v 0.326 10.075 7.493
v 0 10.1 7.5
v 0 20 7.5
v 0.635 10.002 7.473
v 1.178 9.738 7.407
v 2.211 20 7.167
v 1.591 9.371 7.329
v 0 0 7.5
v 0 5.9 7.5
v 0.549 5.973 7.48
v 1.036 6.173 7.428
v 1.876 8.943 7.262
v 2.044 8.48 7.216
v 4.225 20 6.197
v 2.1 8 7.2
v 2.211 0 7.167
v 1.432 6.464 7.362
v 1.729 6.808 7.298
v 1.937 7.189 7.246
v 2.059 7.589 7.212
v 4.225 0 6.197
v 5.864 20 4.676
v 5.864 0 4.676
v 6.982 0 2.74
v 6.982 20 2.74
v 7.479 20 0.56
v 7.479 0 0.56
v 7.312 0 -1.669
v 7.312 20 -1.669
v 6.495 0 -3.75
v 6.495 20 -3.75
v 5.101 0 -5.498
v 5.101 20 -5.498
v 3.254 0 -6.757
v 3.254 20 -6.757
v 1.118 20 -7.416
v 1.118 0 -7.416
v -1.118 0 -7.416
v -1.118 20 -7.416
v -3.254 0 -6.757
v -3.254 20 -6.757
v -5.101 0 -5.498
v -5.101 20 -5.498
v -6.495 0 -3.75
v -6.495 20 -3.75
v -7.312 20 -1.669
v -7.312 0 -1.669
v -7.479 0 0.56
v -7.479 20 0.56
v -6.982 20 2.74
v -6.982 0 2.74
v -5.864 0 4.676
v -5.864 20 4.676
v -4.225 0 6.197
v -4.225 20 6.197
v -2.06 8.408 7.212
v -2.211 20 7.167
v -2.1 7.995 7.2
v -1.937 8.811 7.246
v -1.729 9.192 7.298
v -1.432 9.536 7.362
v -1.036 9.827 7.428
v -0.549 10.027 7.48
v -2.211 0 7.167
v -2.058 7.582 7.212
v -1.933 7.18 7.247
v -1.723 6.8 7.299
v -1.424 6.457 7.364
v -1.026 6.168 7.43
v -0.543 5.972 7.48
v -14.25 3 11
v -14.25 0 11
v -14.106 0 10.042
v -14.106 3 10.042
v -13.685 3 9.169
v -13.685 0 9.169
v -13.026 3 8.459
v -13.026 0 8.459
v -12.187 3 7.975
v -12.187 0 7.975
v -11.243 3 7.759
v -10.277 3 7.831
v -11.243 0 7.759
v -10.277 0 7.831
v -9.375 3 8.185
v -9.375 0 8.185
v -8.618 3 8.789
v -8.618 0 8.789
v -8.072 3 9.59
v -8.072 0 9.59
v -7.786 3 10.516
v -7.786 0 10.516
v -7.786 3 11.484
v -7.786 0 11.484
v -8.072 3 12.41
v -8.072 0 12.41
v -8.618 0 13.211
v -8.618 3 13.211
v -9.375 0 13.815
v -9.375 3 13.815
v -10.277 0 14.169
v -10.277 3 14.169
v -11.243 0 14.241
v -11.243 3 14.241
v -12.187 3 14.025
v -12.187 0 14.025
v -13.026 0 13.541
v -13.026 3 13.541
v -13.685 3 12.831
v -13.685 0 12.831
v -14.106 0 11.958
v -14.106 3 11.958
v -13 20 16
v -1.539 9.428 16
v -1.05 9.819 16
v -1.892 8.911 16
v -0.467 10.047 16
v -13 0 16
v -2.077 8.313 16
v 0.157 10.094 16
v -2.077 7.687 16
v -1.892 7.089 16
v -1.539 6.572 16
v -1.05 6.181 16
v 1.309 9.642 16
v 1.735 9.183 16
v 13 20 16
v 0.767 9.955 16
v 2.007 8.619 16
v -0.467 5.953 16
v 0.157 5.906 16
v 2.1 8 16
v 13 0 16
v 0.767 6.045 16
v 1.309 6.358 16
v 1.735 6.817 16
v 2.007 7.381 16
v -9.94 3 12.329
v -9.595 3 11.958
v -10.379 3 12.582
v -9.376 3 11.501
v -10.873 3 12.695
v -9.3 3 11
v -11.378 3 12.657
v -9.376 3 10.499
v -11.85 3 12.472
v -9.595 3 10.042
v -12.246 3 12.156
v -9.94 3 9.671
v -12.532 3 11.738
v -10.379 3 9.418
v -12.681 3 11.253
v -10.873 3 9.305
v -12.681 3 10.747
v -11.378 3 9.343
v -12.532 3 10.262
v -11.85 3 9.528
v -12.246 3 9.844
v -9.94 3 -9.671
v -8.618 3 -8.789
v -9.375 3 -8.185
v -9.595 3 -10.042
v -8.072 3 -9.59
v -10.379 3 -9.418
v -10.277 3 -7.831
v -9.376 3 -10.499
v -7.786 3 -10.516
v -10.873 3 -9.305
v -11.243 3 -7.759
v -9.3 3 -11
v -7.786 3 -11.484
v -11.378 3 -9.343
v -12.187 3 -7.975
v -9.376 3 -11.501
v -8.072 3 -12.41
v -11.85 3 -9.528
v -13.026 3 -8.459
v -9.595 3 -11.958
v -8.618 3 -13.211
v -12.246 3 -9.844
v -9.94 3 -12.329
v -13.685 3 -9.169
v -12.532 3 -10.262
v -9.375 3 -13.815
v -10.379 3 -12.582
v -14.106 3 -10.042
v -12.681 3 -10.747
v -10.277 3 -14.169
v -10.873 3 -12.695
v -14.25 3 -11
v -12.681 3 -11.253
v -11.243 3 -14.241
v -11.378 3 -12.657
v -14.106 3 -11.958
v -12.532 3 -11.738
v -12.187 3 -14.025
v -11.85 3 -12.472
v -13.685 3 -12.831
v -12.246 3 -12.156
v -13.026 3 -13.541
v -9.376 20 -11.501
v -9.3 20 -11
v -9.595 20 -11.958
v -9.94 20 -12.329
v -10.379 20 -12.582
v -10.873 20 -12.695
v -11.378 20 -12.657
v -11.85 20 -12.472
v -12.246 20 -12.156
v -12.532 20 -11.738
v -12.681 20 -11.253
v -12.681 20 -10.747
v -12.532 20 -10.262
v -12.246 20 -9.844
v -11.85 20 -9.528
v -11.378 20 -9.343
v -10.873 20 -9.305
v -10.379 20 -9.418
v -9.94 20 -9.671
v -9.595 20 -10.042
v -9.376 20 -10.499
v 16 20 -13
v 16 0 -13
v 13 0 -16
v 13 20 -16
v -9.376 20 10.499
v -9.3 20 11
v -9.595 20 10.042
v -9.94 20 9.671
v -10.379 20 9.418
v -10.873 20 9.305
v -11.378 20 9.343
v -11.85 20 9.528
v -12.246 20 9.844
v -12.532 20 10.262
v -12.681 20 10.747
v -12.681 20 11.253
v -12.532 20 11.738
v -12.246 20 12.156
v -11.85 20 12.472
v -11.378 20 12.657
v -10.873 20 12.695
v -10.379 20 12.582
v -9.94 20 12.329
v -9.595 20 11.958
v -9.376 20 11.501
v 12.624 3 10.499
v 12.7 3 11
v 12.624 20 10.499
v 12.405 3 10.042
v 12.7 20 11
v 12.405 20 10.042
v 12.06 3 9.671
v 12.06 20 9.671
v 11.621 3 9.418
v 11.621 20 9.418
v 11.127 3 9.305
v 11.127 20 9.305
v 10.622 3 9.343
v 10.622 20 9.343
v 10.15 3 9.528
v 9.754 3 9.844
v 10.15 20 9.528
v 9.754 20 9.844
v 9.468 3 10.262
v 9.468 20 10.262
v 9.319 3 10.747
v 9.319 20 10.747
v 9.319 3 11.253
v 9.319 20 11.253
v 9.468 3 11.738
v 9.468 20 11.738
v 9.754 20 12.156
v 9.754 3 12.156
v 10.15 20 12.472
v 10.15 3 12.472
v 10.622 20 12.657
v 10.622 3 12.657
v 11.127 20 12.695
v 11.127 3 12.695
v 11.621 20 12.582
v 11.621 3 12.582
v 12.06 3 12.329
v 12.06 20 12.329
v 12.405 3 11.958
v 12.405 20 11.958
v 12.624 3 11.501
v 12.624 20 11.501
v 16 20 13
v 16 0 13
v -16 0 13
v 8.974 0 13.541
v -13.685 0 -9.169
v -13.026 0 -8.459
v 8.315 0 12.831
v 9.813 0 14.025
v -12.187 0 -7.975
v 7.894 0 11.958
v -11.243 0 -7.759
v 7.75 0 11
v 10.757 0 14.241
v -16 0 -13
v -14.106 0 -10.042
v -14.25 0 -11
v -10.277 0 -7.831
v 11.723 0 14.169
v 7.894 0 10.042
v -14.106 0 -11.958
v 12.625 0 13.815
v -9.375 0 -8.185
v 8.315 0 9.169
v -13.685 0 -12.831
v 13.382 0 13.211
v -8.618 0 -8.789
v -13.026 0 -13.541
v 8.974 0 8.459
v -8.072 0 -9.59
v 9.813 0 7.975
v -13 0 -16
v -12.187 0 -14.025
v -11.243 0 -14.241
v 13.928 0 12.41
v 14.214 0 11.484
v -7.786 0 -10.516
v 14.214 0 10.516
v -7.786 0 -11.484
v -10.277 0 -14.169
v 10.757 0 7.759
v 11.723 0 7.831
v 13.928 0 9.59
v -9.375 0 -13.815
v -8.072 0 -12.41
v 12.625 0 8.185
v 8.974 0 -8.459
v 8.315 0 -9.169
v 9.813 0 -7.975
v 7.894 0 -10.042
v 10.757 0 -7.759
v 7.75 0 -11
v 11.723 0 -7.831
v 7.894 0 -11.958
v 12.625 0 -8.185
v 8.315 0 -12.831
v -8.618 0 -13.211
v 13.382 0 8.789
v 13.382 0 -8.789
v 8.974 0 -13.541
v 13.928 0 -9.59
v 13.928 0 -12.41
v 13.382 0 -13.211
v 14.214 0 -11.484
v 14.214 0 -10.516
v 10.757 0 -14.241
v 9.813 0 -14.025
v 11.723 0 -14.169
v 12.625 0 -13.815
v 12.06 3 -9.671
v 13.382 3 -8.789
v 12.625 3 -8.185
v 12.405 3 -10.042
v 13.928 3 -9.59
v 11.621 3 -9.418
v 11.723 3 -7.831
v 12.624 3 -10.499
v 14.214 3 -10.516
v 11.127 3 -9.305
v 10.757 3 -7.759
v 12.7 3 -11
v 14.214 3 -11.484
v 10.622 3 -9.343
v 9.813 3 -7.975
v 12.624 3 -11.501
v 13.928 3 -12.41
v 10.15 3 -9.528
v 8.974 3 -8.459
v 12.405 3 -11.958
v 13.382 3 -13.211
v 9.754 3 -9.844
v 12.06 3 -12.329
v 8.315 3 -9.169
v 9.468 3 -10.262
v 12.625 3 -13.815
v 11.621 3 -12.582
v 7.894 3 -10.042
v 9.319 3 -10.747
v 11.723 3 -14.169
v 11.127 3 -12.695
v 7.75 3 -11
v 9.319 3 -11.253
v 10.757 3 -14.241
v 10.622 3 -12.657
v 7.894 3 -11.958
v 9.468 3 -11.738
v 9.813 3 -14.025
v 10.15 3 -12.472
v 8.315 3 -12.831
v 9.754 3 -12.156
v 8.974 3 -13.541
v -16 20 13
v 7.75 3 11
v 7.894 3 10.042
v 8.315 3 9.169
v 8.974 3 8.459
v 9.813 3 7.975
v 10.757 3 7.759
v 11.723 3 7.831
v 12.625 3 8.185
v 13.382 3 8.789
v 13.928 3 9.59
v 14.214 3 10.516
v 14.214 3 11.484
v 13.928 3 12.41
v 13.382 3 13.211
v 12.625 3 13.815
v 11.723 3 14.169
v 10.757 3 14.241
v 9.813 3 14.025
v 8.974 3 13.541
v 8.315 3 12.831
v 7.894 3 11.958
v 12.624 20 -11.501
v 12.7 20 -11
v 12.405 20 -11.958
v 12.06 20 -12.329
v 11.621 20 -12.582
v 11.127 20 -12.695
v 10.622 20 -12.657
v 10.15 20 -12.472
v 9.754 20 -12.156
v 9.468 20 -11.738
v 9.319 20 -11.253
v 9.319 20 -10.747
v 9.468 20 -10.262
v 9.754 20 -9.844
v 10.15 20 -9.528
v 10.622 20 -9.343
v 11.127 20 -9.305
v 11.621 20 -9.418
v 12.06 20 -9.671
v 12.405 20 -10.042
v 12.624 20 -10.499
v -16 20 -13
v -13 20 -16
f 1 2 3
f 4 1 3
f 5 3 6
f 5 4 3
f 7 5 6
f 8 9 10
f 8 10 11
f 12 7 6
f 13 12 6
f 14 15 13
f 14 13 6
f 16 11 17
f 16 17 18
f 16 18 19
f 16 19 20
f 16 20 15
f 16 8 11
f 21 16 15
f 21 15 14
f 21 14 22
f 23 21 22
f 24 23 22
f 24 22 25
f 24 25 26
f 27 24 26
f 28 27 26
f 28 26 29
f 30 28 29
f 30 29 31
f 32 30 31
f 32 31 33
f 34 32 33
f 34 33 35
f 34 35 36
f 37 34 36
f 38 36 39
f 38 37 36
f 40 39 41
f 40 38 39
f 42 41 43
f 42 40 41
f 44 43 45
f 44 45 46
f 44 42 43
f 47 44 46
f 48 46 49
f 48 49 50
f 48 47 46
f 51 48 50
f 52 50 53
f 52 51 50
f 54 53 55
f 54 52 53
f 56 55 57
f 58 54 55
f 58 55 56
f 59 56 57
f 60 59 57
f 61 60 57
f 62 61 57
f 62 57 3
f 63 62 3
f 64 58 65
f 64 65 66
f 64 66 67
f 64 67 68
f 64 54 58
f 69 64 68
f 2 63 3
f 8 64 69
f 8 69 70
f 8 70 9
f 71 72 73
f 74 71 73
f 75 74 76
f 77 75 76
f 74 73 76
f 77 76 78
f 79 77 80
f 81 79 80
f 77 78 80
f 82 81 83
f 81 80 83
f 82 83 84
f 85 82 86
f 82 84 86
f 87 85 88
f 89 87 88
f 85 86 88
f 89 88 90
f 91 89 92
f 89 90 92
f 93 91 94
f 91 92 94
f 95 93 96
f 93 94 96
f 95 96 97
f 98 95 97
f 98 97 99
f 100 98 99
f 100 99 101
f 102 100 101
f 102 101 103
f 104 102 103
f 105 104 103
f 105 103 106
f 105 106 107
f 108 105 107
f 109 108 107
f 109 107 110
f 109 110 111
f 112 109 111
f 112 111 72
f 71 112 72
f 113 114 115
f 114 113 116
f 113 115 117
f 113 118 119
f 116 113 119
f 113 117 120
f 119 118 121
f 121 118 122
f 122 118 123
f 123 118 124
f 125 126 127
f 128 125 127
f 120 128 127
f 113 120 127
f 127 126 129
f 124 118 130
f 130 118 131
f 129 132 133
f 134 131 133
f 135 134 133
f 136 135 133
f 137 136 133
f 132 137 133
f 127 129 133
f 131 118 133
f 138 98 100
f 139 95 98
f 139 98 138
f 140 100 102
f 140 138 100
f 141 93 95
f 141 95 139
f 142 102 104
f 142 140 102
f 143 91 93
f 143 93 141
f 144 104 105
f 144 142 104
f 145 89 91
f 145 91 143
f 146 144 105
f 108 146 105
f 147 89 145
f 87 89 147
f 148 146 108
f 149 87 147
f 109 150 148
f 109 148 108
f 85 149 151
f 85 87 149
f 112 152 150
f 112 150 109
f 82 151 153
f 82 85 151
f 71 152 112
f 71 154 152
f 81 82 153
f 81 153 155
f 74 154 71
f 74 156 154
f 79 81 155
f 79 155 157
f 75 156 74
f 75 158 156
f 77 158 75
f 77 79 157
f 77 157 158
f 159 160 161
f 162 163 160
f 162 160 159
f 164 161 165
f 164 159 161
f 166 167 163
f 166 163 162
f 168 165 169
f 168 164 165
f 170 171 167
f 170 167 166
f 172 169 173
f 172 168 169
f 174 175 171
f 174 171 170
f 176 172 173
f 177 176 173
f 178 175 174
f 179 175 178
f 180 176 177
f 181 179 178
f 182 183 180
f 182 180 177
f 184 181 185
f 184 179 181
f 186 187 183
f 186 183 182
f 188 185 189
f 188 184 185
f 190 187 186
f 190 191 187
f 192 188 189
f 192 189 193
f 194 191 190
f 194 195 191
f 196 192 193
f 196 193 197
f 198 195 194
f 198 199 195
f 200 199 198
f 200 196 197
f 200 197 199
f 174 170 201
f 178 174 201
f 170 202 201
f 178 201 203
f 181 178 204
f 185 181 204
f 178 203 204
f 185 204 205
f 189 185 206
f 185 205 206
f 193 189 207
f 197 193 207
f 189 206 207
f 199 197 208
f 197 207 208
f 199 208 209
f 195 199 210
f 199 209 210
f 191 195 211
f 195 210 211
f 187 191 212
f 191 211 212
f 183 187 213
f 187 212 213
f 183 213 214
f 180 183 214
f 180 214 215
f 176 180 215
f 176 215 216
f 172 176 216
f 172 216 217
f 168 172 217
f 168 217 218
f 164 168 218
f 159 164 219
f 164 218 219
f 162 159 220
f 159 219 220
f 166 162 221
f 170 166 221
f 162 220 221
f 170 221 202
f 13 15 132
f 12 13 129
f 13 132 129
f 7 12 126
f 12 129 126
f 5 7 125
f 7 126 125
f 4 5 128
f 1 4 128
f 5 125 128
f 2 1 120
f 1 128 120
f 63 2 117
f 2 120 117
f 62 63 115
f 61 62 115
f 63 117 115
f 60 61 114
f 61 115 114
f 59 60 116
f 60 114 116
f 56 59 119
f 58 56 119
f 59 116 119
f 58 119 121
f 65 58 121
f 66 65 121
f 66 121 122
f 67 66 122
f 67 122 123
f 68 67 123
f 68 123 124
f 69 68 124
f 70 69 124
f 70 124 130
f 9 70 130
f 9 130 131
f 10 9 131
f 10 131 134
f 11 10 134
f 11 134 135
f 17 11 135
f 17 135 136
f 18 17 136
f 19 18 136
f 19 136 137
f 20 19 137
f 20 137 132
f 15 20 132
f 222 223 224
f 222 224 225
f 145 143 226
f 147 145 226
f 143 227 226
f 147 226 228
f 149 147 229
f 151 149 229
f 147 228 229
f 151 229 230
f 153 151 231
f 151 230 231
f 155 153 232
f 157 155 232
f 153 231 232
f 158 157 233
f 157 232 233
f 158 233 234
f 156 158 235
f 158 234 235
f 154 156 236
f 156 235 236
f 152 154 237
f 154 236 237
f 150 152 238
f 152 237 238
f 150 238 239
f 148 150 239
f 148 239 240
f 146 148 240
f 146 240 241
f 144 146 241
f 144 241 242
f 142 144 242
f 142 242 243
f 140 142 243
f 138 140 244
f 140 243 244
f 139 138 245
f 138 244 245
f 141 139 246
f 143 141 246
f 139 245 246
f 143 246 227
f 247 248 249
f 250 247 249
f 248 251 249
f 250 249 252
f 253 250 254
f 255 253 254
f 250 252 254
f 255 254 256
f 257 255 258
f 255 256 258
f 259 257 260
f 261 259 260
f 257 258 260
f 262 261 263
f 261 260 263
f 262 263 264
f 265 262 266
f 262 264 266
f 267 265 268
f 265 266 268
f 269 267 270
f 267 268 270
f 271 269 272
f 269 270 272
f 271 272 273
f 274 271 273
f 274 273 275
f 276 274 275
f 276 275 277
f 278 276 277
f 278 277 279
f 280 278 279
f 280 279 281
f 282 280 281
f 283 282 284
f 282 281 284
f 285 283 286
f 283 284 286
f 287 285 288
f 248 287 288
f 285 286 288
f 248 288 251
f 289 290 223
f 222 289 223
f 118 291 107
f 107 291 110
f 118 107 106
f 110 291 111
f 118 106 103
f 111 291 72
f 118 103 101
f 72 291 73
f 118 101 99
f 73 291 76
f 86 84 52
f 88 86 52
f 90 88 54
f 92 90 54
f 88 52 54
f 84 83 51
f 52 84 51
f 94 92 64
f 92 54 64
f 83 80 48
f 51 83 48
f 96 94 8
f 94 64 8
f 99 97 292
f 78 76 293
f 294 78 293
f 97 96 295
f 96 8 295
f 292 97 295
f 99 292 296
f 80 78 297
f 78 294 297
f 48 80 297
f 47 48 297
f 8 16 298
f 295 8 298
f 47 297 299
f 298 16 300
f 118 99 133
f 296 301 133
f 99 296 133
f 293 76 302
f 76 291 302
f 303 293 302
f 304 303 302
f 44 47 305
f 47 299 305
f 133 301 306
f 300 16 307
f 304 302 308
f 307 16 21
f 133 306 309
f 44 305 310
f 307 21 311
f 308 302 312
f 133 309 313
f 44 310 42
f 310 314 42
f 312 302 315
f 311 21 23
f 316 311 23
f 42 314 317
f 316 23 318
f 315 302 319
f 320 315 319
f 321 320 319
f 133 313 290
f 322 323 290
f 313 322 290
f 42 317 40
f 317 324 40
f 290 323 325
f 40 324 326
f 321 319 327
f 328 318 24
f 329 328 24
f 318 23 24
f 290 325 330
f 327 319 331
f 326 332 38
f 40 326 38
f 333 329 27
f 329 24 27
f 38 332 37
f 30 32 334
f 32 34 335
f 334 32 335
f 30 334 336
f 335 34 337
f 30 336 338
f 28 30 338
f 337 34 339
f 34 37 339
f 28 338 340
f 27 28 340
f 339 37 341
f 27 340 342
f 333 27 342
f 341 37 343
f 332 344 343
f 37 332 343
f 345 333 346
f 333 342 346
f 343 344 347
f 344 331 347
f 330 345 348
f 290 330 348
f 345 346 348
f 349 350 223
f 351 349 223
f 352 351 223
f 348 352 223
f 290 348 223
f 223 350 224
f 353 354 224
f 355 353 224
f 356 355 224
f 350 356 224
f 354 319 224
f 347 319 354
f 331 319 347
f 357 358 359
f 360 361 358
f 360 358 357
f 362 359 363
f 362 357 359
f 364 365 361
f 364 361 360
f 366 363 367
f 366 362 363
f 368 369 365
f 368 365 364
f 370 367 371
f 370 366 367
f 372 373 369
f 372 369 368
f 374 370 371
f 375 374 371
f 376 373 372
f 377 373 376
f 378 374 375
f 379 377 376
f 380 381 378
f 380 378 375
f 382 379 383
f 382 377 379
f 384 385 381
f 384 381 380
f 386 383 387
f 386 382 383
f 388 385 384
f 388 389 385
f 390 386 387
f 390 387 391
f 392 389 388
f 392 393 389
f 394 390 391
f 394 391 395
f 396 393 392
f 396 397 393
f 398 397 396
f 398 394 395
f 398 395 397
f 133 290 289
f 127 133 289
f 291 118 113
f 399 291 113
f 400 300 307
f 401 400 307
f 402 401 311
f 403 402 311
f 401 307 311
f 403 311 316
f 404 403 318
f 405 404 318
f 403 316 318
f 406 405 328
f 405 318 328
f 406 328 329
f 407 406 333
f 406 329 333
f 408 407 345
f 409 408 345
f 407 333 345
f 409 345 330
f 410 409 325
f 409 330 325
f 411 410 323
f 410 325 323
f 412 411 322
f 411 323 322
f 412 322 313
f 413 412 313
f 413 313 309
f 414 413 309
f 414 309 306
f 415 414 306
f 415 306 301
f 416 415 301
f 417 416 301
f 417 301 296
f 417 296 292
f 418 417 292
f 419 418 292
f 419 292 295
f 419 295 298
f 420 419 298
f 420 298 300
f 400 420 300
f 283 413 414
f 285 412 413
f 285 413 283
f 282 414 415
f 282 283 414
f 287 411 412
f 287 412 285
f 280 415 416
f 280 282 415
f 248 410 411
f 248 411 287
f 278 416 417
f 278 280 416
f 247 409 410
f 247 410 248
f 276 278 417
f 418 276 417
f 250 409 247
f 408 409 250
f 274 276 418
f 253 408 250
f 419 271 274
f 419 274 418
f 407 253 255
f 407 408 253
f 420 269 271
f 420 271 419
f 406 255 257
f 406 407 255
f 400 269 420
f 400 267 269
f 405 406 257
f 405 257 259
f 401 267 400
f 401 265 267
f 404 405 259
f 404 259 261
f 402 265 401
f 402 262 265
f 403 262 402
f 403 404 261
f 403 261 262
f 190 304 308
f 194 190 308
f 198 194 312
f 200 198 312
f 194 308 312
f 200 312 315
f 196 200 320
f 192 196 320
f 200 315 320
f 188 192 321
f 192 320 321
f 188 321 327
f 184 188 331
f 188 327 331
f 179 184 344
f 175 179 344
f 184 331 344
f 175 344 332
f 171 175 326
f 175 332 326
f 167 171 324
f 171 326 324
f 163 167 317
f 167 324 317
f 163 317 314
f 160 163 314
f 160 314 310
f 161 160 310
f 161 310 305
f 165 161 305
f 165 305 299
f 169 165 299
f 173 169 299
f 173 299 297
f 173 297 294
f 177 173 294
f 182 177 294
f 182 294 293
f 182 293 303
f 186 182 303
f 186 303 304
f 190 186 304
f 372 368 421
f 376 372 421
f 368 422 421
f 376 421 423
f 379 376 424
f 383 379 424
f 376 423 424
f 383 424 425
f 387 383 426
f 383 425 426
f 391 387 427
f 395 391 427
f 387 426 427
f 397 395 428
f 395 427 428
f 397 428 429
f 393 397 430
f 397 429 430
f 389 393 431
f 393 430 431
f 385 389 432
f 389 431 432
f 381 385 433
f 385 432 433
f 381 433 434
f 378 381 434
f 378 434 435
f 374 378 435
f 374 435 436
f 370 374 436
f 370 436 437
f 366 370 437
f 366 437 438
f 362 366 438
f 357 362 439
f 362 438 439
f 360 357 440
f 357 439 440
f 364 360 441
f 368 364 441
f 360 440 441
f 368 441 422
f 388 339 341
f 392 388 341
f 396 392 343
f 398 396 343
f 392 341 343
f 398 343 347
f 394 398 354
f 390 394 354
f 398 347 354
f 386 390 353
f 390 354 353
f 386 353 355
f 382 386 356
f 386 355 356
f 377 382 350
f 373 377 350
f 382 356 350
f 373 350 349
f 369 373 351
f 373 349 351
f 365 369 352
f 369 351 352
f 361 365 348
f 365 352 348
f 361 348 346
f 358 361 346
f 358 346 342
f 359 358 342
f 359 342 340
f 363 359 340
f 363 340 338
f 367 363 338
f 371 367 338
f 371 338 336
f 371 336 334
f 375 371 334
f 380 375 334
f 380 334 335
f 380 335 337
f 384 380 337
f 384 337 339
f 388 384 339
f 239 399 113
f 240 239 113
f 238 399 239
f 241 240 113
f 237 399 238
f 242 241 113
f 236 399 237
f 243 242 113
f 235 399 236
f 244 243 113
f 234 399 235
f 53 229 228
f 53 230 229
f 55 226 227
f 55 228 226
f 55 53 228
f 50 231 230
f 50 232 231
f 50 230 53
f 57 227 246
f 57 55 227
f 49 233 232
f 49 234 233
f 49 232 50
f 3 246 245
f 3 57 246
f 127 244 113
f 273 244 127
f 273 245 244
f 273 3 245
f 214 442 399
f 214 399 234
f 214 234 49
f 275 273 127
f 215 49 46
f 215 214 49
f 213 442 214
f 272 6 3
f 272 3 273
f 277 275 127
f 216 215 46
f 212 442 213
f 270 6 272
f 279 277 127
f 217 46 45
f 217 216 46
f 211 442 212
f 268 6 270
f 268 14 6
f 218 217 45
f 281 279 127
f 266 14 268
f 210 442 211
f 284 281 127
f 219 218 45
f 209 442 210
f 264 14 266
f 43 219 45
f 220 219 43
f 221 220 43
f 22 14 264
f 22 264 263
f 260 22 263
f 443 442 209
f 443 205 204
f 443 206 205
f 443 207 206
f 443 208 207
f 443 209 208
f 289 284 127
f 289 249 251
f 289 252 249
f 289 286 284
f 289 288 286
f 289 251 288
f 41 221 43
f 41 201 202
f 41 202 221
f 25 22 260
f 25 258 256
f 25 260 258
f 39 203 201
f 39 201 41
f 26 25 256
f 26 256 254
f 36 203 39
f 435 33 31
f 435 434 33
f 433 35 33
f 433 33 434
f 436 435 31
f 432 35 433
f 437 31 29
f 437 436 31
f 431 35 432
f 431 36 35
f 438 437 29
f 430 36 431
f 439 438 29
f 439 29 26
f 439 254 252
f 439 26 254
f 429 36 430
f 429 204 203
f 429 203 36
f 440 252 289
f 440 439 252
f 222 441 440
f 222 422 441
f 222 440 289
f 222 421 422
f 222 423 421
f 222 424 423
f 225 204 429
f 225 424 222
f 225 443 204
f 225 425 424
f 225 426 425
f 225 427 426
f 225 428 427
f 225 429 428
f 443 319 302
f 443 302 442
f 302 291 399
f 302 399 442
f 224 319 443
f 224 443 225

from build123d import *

# Parameters (mm, degrees)
SKETCH1_W                      = 32
SKETCH1_H                      = 32
SKETCH1_R                      = 7.5
BOSS_EXTRUDE1_DEPTH            = 20
CBORE_FOR_M3_SHCS1_D           = 3.4
CBORE_FOR_M3_SHCS1_CBORE_D     = 6.5
CBORE_FOR_M3_SHCS1_CBORE_DEPTH = 3
M5X0_8_TAPPED_HOLE1_REACH      = 42.988
M5X0_8_TAPPED_HOLE1_BORE_R     = 2.1
CHAMFER1_SIZE                  = 3


with BuildPart() as part:
    # Sketch1 → Boss-Extrude1 (new body)
    with BuildSketch(Plane(origin=(0, 0, 0), x_dir=(1, 0, 0), z_dir=(0, 1, 0))):
        Rectangle(SKETCH1_W, SKETCH1_H)
        with Locations(Location((0, 0, 0), (0, 0, 270))):
            Circle(SKETCH1_R, mode=Mode.SUBTRACT)
    extrude(amount=BOSS_EXTRUDE1_DEPTH)

    # CBORE for M3 SHCS1 (through all)
    with Locations(Plane(origin=(0, 0, 0), x_dir=(-1, 0, 0), z_dir=(0, -1, 0))):
        with Locations((-11, -11), (11, -11), (11, 11), (-11, 11)):
            CounterBoreHole(CBORE_FOR_M3_SHCS1_D / 2, CBORE_FOR_M3_SHCS1_CBORE_D / 2, CBORE_FOR_M3_SHCS1_CBORE_DEPTH)

    # M5x0.8 Tapped Hole1 bore → M5x0.8 Tapped Hole1 (cut, up to next)
    with BuildSketch(Plane.XY.offset(16), mode=Mode.PRIVATE) as m5x0_8_tapped_hole1_sk1:
        with Locations((0, 8)):
            Circle(M5X0_8_TAPPED_HOLE1_BORE_R)
    m5x0_8_tapped_hole1_tool1 = extrude(m5x0_8_tapped_hole1_sk1.sketch, amount=-M5X0_8_TAPPED_HOLE1_REACH, mode=Mode.PRIVATE) & part.part
    add(m5x0_8_tapped_hole1_tool1.solids().sort_by_distance((0, 8, 16))[0], mode=Mode.SUBTRACT)

    # Chamfer1
    chamfer1_edges = [part.edges().sort_by_distance(p)[0] for p in [
        (16, 10, 16),
        (-16, 10, 16),
        (-16, 10, -16),
        (16, 10, -16),
    ]]
    chamfer(chamfer1_edges, length=CHAMFER1_SIZE)


solid = part.part
